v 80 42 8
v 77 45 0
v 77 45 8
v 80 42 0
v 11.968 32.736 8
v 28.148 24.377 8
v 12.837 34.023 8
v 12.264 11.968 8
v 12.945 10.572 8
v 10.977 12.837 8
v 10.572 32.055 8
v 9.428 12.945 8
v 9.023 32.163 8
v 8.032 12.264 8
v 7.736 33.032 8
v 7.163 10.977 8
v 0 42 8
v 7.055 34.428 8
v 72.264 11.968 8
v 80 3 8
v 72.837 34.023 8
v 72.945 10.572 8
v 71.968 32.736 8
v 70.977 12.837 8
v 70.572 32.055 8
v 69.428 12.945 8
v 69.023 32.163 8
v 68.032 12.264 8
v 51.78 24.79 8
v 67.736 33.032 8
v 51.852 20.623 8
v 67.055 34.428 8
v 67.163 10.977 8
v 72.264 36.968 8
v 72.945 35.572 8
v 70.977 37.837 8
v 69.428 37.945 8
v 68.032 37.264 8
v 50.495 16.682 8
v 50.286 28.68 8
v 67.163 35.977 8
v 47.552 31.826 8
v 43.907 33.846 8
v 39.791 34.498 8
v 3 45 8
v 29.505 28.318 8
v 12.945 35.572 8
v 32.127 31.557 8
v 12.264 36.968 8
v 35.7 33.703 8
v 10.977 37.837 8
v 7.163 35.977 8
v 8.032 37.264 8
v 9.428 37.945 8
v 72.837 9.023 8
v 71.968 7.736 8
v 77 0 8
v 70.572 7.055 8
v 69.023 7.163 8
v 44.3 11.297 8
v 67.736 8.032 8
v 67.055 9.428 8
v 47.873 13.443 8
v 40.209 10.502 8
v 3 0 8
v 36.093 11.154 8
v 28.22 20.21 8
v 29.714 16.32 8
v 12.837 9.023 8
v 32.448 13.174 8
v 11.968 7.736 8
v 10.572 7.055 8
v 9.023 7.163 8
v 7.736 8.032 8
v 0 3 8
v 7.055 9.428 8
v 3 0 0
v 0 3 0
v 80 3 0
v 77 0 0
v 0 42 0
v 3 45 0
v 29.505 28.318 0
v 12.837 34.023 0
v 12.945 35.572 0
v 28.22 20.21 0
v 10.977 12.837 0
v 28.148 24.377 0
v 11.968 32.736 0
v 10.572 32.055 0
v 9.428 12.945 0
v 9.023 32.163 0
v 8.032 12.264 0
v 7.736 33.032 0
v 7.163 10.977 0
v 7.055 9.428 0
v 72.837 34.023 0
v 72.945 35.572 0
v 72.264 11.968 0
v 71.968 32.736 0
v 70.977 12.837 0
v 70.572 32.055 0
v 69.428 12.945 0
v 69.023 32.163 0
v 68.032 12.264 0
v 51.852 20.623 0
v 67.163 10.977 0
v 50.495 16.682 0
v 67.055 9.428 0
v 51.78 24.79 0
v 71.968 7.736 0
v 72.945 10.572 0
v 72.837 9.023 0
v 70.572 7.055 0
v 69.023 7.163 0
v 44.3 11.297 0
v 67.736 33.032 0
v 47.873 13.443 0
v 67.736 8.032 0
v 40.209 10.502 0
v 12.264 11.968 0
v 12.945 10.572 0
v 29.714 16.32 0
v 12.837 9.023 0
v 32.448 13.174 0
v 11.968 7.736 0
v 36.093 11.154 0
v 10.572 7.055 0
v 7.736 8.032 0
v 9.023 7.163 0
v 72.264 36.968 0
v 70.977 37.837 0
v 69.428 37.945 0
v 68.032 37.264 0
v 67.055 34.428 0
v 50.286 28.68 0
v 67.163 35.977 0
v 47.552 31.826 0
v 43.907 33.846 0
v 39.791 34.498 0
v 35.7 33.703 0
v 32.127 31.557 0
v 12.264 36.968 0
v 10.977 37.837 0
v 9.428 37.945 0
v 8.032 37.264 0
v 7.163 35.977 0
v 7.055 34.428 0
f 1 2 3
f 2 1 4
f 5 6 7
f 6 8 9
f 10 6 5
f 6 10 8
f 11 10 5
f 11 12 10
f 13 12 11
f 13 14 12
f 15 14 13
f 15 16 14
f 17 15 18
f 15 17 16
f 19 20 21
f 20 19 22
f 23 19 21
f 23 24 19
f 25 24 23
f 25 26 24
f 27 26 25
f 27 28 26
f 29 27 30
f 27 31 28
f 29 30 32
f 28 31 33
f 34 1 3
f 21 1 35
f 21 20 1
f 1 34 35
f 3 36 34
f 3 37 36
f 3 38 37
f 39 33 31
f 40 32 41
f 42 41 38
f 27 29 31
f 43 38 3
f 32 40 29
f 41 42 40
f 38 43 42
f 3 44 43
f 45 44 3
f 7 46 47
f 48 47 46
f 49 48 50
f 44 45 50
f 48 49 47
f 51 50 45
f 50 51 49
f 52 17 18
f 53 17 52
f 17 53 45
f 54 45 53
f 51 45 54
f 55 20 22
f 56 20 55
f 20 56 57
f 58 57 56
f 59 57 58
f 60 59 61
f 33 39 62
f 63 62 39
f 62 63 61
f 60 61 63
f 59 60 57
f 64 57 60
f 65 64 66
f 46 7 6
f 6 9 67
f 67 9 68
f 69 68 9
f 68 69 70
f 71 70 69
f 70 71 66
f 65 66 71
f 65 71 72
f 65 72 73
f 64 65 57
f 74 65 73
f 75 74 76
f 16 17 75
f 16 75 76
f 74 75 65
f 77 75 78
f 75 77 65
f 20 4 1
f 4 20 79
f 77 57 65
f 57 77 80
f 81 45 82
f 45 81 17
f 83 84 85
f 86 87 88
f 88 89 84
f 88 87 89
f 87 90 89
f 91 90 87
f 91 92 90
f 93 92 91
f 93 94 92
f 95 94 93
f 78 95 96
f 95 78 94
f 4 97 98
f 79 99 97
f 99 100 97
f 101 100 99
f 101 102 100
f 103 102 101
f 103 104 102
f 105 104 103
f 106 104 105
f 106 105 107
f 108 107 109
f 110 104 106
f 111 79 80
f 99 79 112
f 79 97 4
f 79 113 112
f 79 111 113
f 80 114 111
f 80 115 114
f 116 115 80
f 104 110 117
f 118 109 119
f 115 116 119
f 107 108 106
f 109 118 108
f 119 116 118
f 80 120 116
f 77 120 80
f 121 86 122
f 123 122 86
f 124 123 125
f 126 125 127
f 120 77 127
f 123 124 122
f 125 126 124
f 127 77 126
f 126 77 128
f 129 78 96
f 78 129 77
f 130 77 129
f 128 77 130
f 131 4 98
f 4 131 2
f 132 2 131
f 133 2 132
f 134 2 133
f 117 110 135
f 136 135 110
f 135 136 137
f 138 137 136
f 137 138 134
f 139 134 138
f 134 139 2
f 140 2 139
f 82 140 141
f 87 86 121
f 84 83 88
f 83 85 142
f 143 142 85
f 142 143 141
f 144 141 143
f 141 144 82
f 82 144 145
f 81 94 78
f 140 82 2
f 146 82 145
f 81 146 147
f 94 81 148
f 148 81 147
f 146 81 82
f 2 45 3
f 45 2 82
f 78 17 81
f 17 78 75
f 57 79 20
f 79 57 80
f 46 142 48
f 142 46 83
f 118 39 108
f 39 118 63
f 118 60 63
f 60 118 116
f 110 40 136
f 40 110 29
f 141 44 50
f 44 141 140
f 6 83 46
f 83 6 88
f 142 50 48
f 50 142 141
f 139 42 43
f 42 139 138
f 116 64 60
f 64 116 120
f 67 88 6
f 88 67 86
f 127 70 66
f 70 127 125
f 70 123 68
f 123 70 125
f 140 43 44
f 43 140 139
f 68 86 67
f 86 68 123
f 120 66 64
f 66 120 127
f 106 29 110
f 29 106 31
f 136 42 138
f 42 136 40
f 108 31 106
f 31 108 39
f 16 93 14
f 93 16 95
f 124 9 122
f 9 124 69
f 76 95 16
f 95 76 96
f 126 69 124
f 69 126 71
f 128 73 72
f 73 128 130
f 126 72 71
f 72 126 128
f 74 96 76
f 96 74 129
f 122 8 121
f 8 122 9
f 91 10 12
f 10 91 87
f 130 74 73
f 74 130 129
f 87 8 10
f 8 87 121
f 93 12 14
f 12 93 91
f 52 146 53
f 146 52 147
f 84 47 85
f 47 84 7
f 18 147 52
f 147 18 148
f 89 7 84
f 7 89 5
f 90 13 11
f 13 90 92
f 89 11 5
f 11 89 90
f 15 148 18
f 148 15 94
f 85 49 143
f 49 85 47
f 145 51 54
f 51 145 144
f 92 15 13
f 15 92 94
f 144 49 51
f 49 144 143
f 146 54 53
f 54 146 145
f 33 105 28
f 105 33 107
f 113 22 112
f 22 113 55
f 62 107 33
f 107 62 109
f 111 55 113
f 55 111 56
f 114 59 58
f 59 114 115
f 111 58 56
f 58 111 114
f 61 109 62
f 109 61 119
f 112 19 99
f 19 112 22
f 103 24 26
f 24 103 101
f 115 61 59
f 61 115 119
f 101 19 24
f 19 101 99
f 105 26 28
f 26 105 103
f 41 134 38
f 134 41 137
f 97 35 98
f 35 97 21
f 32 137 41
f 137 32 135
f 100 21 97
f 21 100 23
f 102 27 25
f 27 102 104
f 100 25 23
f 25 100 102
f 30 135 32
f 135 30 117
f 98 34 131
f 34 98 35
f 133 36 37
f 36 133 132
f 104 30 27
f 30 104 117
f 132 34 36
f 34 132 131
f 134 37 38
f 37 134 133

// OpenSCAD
$fn = 32;

// ----------------------------------------------------------------------
// Spacer plate: rect 80 x 45
// ----------------------------------------------------------------------

// --- parameters (mm) ---
bore_r = 12;              // centre bore radius
bolt_r = 3;               // bolt hole radius
plate_t = 8;              // plate thickness, Z (extrusion height)
plate_l = 80;             // plate length, X
plate_w = 45;             // plate width, Y
inset = 10;               // corner hole inset

profile = [[3, 0], [77, 0], [80, 3], [80, 42], [77, 45], [3, 45], [0, 42], [0, 3]];  // primary outline, 8 points, counter clockwise
void_1 = [[51.78, 24.79], [50.286, 28.68], [47.552, 31.826], [43.907, 33.846], [39.791, 34.498], [35.7, 33.703], [32.127, 31.557], [29.505, 28.318], [28.148, 24.377], [28.22, 20.21], [29.714, 16.32], [32.448, 13.174], [36.093, 11.154], [40.209, 10.502], [44.3, 11.297], [47.873, 13.443], [50.495, 16.682], [51.852, 20.623]];  // centre bore, 18 points
void_2 = [[12.945, 10.572], [12.264, 11.968], [10.977, 12.837], [9.428, 12.945], [8.032, 12.264], [7.163, 10.977], [7.055, 9.428], [7.736, 8.032], [9.023, 7.163], [10.572, 7.055], [11.968, 7.736], [12.837, 9.023]];  // corner hole, 12 points
void_3 = [[12.945, 35.572], [12.264, 36.968], [10.977, 37.837], [9.428, 37.945], [8.032, 37.264], [7.163, 35.977], [7.055, 34.428], [7.736, 33.032], [9.023, 32.163], [10.572, 32.055], [11.968, 32.736], [12.837, 34.023]];  // corner hole, 12 points
void_4 = [[72.945, 10.572], [72.264, 11.968], [70.977, 12.837], [69.428, 12.945], [68.032, 12.264], [67.163, 10.977], [67.055, 9.428], [67.736, 8.032], [69.023, 7.163], [70.572, 7.055], [71.968, 7.736], [72.837, 9.023]];  // corner hole, 12 points
void_5 = [[72.945, 35.572], [72.264, 36.968], [70.977, 37.837], [69.428, 37.945], [68.032, 37.264], [67.163, 35.977], [67.055, 34.428], [67.736, 33.032], [69.023, 32.163], [70.572, 32.055], [71.968, 32.736], [72.837, 34.023]];  // corner hole, 12 points

// --- the one profile operation ---
difference() {
  linear_extrude(height = plate_t) polygon(points = profile);
  translate([0, 0, -1])
    linear_extrude(height = plate_t + 2) polygon(points = void_1);
  translate([0, 0, -1])
    linear_extrude(height = plate_t + 2) polygon(points = void_2);
  translate([0, 0, -1])
    linear_extrude(height = plate_t + 2) polygon(points = void_3);
  translate([0, 0, -1])
    linear_extrude(height = plate_t + 2) polygon(points = void_4);
  translate([0, 0, -1])
    linear_extrude(height = plate_t + 2) polygon(points = void_5);
}
